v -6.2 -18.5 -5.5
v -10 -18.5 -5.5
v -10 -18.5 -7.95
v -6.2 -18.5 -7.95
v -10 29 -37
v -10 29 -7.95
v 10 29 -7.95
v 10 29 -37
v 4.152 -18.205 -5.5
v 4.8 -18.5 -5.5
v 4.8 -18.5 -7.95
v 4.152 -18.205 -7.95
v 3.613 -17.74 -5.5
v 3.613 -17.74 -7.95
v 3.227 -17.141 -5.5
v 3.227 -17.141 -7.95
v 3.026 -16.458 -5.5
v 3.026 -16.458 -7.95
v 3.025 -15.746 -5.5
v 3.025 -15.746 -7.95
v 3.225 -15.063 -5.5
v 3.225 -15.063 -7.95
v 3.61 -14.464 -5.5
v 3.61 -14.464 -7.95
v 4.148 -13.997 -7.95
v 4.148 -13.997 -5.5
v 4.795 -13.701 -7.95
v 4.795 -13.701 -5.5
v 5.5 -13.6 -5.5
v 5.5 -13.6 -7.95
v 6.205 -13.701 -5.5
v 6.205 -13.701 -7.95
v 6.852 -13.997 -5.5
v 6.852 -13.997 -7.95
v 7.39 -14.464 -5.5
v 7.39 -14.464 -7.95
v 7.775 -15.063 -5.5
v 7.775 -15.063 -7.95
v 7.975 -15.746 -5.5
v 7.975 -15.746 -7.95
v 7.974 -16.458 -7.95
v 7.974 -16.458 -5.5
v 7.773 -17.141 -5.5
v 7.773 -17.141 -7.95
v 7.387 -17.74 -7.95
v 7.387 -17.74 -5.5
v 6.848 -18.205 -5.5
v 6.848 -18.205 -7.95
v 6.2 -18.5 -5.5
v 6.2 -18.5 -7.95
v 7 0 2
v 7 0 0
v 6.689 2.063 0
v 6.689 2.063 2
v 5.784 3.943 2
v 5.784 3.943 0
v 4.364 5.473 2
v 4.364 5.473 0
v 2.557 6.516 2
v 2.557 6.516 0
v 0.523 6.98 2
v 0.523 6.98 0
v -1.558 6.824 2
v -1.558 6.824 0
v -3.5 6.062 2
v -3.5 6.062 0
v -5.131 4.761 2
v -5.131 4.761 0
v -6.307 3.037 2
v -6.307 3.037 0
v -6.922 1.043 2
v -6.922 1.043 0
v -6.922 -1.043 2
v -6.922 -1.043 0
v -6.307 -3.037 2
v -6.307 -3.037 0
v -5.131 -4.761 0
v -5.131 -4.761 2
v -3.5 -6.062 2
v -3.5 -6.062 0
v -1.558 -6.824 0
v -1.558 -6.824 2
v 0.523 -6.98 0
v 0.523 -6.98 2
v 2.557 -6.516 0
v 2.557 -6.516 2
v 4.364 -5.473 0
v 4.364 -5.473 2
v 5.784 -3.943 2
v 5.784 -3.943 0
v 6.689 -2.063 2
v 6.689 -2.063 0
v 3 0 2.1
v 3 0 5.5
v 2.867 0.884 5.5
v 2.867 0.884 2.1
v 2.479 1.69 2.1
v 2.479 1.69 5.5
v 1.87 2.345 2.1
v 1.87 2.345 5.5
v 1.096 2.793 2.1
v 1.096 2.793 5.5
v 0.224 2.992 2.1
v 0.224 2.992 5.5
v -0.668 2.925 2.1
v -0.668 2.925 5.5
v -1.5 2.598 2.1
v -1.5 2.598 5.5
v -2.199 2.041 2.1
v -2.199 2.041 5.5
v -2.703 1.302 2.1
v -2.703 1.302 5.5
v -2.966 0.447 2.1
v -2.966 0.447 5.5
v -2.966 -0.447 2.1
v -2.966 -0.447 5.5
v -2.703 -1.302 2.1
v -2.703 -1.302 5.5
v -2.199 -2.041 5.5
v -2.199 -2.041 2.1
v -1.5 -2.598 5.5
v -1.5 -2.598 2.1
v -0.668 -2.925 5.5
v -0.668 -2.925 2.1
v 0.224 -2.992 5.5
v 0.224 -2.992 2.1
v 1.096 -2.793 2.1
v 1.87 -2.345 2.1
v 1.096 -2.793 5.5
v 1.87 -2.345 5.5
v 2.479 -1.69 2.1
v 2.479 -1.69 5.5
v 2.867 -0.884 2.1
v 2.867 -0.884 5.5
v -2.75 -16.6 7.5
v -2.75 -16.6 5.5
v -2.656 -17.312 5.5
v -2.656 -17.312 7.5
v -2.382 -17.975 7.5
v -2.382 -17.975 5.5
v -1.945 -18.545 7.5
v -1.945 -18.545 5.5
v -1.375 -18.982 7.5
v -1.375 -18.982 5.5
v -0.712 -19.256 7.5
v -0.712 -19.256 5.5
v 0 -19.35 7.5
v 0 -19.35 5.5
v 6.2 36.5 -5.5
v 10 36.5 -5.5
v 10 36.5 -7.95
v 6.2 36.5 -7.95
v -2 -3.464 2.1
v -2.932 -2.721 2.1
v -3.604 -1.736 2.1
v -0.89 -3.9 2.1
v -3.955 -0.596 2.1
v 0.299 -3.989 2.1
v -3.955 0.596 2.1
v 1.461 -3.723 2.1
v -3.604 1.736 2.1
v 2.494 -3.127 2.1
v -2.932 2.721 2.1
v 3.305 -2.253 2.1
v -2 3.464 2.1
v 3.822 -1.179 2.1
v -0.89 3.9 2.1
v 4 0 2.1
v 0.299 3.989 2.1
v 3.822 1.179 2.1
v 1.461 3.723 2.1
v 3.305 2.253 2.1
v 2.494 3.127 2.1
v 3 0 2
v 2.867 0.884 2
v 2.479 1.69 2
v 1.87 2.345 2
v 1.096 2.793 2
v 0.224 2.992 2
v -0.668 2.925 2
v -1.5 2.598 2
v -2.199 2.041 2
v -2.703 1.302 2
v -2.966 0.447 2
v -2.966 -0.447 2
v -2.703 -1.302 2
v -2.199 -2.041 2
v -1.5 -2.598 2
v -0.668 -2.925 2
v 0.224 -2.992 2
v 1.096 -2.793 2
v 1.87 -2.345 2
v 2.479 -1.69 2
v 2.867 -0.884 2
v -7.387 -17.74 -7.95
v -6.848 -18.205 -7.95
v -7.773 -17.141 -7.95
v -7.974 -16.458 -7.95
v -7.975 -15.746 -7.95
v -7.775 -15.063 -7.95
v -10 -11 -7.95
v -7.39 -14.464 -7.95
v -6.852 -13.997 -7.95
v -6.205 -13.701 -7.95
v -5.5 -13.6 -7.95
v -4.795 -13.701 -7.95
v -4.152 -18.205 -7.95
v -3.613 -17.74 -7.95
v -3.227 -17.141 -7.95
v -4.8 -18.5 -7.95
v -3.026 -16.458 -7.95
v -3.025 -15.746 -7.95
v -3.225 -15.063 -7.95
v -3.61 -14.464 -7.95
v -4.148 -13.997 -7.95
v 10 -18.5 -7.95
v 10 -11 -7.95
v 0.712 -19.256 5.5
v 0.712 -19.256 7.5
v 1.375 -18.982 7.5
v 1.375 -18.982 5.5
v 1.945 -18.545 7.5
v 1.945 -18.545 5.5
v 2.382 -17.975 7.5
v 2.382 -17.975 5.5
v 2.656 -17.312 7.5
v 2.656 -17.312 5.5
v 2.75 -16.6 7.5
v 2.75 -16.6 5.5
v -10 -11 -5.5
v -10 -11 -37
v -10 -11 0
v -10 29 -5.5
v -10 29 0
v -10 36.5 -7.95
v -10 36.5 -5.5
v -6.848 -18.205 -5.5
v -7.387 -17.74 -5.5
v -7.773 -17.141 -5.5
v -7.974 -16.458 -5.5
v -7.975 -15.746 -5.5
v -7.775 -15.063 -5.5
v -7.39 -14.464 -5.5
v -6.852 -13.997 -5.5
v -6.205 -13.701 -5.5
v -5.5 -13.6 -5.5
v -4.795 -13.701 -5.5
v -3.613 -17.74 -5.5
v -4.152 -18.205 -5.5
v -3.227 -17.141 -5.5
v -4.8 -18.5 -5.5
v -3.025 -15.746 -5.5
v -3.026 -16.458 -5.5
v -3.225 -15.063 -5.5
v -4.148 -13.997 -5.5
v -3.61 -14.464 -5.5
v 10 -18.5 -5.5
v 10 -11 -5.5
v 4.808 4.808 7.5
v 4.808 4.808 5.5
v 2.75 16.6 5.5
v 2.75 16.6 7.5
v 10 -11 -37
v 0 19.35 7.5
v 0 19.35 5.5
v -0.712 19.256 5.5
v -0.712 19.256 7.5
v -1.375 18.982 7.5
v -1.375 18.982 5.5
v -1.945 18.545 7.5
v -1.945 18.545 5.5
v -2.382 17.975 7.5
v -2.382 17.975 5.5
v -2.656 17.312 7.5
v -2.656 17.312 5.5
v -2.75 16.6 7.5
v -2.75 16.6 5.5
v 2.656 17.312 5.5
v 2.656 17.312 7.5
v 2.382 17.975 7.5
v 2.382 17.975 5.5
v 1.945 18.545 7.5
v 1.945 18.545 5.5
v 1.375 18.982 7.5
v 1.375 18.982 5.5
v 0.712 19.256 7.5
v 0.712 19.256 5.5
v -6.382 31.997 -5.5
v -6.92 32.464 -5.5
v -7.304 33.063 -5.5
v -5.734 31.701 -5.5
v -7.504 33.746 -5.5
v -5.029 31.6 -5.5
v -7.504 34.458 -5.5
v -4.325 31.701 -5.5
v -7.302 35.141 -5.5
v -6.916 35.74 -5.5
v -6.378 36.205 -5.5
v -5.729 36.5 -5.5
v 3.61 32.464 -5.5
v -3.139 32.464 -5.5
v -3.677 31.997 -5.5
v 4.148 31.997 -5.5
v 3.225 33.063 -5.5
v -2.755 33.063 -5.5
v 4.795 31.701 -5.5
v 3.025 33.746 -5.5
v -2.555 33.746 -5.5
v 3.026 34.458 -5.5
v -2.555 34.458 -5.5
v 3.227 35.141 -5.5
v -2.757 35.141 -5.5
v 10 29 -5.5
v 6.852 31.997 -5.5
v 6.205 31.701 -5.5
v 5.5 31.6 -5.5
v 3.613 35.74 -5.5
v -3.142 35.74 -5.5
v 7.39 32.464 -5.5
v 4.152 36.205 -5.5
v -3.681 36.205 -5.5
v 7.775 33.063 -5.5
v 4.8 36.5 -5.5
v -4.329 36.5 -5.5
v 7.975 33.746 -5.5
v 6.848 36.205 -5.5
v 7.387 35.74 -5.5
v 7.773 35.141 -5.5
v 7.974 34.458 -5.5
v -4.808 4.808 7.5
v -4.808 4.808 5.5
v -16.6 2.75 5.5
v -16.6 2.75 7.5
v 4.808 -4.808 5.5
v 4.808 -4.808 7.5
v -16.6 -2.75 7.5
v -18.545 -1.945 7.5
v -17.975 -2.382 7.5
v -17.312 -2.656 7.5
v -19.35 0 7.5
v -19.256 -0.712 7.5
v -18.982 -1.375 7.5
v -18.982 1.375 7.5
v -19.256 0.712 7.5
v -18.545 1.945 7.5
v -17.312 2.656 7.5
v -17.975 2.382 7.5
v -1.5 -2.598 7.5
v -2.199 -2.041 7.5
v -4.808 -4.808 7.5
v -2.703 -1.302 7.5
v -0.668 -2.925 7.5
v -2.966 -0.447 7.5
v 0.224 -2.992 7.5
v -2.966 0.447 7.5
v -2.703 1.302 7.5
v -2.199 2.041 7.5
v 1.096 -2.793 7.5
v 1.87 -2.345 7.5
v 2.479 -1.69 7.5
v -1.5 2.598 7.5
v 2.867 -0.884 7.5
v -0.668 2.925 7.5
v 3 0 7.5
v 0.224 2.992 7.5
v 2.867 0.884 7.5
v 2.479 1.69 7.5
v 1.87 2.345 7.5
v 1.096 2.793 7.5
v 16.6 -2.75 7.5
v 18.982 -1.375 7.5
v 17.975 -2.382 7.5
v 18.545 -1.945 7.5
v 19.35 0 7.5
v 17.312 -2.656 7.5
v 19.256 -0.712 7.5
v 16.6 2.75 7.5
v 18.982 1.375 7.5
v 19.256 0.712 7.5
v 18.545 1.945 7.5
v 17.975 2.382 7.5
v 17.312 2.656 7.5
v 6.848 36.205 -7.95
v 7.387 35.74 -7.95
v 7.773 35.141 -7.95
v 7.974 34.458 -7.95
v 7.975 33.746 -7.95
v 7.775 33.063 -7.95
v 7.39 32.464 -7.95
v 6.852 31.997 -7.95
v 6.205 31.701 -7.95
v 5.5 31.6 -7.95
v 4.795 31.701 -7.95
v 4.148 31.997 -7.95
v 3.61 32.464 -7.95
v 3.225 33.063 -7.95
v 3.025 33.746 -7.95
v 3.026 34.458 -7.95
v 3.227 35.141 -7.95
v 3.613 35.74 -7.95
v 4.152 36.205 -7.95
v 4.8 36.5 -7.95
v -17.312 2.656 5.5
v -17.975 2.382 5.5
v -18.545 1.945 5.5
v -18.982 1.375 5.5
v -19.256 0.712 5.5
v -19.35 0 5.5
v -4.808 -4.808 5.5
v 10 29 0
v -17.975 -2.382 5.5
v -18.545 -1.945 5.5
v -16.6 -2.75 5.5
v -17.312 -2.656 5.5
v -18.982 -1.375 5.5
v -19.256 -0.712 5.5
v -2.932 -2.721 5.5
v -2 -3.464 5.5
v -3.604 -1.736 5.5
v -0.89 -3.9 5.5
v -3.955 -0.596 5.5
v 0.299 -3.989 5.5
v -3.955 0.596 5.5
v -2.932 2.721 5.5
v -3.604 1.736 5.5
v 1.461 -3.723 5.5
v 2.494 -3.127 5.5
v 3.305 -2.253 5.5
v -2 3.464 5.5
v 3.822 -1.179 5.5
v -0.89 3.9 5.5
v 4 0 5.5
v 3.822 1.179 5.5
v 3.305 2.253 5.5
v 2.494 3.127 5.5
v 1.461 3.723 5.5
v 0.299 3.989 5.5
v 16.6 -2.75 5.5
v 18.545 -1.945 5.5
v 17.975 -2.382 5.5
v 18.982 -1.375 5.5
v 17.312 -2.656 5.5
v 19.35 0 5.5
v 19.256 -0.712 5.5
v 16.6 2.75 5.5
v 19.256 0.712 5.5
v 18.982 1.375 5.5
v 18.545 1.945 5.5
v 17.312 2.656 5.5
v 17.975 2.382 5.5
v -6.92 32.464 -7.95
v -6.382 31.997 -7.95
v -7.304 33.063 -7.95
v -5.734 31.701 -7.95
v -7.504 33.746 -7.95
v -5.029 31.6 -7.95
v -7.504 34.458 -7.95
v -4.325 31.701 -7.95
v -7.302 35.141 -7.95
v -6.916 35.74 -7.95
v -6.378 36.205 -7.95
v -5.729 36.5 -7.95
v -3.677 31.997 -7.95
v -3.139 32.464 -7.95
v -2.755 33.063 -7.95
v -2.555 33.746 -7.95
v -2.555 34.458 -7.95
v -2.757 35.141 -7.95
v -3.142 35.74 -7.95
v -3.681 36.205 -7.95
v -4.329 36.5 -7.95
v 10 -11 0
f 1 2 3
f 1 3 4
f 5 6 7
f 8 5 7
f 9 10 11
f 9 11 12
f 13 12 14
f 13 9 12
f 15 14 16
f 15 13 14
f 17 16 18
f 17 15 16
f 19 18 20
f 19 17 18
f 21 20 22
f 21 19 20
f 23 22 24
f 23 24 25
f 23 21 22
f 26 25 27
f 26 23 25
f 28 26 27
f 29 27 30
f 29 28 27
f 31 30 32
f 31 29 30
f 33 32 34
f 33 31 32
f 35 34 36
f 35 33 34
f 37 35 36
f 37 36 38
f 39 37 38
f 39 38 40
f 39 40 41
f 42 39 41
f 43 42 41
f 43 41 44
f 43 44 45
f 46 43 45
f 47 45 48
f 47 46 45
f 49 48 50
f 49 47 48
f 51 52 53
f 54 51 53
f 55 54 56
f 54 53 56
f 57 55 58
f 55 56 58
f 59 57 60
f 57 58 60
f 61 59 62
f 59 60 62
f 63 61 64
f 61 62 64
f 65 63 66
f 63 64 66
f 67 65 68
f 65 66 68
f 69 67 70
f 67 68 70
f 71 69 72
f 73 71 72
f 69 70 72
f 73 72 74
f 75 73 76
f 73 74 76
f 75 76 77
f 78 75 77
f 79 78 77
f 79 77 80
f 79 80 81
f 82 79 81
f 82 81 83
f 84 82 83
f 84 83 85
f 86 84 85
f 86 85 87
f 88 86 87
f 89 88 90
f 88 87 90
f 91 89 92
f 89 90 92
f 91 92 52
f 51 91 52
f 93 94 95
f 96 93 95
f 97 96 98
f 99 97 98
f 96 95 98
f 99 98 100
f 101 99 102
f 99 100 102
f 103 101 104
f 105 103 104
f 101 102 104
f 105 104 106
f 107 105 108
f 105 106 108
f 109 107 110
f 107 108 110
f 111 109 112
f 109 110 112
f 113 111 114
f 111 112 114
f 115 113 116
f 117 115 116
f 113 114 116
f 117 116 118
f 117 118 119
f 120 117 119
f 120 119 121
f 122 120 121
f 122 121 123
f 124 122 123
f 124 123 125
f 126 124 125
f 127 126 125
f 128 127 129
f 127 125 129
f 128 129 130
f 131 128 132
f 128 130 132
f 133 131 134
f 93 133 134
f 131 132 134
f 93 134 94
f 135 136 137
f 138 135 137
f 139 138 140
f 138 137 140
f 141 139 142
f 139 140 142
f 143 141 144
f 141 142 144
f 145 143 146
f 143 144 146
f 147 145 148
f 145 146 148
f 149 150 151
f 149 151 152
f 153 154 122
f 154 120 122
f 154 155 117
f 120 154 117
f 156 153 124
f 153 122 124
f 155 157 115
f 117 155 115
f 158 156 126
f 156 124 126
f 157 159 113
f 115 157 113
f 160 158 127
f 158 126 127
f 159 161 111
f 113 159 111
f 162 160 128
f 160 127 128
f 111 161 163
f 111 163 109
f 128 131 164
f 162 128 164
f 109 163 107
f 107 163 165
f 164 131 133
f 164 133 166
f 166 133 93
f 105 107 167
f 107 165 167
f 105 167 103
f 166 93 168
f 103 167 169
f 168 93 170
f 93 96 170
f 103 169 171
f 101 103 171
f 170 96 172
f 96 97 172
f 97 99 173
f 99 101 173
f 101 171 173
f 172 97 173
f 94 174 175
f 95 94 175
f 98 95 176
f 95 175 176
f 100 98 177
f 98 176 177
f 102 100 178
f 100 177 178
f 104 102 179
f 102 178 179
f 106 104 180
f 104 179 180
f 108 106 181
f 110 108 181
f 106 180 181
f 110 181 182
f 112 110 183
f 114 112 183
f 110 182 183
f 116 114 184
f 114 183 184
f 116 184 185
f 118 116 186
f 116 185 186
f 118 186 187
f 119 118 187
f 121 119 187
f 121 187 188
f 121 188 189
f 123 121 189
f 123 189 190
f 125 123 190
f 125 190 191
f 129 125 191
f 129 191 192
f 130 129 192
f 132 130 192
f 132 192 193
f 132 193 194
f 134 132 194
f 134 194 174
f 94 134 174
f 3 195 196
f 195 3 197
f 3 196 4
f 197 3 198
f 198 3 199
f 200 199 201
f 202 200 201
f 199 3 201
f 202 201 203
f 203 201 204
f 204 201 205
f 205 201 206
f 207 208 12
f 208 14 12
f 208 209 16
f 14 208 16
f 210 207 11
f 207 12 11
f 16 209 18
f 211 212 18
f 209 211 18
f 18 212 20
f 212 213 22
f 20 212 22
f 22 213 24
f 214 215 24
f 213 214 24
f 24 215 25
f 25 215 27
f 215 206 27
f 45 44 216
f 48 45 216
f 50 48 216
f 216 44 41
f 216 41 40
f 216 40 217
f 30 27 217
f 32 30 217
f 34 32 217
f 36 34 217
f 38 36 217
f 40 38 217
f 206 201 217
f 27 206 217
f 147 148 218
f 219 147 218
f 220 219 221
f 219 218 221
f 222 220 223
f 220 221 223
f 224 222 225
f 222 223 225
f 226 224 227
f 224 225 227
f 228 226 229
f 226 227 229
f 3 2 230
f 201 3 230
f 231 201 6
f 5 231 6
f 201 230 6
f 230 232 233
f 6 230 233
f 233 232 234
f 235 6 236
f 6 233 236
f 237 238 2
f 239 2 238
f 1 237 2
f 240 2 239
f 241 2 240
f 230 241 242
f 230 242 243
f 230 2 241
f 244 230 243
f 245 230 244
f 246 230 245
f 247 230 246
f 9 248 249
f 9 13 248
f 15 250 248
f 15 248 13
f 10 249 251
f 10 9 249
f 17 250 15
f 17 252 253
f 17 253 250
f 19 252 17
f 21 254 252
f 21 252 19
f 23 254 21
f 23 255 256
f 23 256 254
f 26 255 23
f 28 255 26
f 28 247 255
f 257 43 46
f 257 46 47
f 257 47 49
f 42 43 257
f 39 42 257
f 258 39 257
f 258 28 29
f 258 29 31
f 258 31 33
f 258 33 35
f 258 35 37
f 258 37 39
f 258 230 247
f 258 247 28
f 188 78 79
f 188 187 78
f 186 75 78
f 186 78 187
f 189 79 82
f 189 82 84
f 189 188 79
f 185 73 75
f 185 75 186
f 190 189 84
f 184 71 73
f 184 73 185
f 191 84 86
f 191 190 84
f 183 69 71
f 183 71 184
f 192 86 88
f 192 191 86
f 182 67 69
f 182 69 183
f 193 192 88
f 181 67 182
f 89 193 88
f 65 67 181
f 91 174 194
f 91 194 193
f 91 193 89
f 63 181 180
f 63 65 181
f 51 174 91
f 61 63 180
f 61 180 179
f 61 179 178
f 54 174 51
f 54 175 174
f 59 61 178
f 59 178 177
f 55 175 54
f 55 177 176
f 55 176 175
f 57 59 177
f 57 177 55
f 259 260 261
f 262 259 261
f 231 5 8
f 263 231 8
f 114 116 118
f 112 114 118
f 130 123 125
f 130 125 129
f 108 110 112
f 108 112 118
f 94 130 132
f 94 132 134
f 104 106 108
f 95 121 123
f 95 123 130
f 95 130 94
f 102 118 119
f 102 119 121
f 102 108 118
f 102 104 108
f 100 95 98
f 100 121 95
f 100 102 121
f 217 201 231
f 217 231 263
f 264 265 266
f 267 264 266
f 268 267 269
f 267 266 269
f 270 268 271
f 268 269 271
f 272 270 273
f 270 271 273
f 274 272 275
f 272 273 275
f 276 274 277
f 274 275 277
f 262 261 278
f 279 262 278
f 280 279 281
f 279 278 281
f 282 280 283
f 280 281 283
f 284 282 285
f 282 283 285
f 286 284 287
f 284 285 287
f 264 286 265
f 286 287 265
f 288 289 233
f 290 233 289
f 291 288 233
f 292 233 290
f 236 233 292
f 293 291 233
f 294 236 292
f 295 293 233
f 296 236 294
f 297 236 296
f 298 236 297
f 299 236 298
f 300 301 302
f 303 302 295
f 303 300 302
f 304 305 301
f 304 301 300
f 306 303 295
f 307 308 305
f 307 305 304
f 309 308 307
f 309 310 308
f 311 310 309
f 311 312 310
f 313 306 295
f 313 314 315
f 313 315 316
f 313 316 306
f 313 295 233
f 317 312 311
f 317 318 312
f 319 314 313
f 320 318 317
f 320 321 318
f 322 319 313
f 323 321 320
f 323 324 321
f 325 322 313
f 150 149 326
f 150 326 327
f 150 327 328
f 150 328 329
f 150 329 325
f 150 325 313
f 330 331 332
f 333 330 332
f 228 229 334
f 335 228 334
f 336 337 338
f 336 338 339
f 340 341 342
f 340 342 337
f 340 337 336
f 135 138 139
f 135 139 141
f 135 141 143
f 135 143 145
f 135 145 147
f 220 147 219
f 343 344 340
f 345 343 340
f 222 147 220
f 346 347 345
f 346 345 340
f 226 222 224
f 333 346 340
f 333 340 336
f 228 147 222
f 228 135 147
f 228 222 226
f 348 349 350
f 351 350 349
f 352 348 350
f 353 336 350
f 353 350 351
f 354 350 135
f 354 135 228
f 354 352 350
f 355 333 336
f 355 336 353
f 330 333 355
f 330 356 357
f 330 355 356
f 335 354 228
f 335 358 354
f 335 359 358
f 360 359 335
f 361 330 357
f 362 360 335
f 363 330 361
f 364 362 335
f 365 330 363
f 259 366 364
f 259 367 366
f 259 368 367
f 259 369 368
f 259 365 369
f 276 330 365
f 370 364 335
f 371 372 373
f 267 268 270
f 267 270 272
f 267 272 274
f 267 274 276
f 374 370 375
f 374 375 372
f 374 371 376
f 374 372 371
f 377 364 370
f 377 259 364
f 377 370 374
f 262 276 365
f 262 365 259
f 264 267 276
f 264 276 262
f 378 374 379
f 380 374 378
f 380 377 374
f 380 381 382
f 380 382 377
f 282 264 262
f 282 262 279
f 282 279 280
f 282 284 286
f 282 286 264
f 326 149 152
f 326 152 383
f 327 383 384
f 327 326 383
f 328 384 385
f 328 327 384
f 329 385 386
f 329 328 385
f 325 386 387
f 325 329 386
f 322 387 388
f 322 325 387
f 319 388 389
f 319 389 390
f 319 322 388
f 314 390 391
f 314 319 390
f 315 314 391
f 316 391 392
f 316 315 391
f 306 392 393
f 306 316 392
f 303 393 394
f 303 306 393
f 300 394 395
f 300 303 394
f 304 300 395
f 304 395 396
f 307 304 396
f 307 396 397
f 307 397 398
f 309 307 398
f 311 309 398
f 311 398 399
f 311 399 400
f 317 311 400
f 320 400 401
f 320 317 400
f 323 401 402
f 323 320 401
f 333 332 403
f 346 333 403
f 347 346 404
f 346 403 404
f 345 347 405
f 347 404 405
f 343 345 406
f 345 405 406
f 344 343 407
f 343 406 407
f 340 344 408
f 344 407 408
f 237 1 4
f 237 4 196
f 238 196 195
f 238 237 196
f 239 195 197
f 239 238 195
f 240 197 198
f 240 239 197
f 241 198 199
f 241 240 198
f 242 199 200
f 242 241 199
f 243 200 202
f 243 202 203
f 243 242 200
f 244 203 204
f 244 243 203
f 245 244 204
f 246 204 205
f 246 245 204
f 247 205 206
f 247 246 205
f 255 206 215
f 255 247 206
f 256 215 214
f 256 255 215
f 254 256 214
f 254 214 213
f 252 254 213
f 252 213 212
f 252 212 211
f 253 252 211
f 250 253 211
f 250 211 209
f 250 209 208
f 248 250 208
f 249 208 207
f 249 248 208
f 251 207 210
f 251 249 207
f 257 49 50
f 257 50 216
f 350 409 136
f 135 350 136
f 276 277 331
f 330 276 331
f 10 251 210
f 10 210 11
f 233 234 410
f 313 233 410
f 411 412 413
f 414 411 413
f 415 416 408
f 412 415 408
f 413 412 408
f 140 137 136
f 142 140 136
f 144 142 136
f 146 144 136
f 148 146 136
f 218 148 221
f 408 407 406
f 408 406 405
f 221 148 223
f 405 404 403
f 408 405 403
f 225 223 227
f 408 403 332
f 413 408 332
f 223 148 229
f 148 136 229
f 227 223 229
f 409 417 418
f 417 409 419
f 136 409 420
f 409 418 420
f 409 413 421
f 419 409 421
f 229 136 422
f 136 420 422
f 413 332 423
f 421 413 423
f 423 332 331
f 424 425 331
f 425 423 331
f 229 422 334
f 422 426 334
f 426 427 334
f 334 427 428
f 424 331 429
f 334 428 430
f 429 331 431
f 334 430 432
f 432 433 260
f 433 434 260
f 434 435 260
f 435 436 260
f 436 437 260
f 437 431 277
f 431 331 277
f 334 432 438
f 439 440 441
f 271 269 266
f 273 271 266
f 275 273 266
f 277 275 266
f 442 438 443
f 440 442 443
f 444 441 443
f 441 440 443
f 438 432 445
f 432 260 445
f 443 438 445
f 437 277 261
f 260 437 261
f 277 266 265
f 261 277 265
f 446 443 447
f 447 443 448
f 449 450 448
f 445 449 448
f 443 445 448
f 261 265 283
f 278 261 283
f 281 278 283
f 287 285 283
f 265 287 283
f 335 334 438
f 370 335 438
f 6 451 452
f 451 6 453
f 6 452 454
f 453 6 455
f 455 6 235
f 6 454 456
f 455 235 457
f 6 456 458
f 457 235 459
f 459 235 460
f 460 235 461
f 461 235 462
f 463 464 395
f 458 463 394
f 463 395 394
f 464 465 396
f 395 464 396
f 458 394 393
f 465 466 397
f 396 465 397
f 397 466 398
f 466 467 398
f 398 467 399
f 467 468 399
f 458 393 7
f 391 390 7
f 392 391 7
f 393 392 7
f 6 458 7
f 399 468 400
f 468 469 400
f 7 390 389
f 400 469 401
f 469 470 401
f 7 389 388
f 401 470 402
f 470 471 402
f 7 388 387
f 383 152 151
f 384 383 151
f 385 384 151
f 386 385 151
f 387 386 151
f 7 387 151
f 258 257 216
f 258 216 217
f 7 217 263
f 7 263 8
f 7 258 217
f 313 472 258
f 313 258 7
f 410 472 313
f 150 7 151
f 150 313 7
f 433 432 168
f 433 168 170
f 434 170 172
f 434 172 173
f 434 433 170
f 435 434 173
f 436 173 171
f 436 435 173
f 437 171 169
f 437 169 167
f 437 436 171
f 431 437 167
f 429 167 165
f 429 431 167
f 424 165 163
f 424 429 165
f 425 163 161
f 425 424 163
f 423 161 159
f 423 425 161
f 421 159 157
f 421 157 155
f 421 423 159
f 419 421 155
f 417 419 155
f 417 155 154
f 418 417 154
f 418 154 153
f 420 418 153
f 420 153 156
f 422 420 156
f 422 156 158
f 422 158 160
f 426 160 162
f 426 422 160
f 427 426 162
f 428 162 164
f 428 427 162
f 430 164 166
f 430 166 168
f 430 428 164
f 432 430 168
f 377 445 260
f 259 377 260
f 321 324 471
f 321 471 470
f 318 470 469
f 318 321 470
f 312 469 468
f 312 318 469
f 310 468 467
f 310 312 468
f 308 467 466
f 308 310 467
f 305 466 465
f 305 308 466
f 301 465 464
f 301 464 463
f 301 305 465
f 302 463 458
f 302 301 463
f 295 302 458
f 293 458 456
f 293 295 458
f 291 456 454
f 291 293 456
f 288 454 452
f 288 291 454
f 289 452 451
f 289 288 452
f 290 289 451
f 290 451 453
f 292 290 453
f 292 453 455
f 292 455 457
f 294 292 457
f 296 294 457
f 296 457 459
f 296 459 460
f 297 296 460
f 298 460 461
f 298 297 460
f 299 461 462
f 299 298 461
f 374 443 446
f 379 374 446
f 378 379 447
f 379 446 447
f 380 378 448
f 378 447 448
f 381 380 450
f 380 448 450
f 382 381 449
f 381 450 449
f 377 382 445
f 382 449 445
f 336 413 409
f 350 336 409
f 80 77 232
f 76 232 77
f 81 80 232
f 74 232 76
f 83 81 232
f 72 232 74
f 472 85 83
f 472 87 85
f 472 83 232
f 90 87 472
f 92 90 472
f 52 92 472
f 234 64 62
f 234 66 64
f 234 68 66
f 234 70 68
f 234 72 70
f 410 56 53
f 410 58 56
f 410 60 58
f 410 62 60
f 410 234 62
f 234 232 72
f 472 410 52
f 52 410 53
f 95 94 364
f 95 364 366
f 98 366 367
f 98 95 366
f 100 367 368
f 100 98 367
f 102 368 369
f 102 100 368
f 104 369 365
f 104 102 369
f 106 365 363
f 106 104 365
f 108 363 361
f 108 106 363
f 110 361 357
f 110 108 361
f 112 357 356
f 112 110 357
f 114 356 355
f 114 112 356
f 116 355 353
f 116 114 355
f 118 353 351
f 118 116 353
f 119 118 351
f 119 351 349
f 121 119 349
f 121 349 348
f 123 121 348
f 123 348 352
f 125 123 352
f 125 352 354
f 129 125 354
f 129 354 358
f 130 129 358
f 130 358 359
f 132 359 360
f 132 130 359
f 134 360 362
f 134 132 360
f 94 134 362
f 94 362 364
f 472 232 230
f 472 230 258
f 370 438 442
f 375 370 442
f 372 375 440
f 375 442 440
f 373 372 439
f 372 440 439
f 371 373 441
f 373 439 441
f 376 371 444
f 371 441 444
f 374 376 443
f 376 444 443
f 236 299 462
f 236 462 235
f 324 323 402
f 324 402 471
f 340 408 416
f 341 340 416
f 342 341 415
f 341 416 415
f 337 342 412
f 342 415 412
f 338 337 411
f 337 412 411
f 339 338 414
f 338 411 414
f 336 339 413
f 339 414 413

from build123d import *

# Parameters (mm, degrees)
F0_R     = 7
F0_R_2   = 3
F1_DEPTH = 2
F2_DEPTH = 5.5
F0_W     = 20
F0_H     = 40
F3_DEPTH = 37
F4_START = -5.5
F4_DEPTH = 2.45
F5_R     = 4
F5_R_2   = 3
F6_DEPTH = 2
F7_DEPTH = 3.4


with BuildPart() as f1:
    # F0 (on Top) → F1 (new body)
    with BuildSketch(Plane.XY):
        Circle(F0_R)
        Circle(F0_R_2, mode=Mode.SUBTRACT)
        Circle(F0_R_2)
    extrude(amount=F1_DEPTH)

    # F0 (on Top) → F2 (join)
    with BuildSketch(Plane.XY):
        Circle(F0_R_2)
    extrude(amount=F2_DEPTH)

    # F0 (on Top) → F3 (join)
    with BuildSketch(Plane.XY):
        with Locations((0, 9)):
            Rectangle(F0_W, F0_H)
        Circle(F0_R, mode=Mode.SUBTRACT)
        Circle(F0_R)
        Circle(F0_R_2, mode=Mode.SUBTRACT)
        Circle(F0_R_2)
    extrude(amount=-F3_DEPTH)

    # F0 (on Top) → F4 (join)
    with BuildSketch(Plane.XY.offset(F4_START)):
        with BuildLine():
            Line((-10, 29), (10, 29))
            Line((10, 29), (10, 36.5))
            Line((10, 36.5), (6.2, 36.5))
            ThreePointArc((6.2, 36.5), (7.5, 35.6), (8, 34.1))
            ThreePointArc((8, 34.1), (4, 32.1), (4.8, 36.5))
            Line((4.8, 36.5), (-4.3294117647, 36.5))
            ThreePointArc((-4.3294117647, 36.5), (-3.0294117647, 35.6), (-2.5294117647, 34.1))
            ThreePointArc((-2.5294117647, 34.1), (-6.5294117647, 32.1), (-5.7294117647, 36.5))
            Line((-5.7294117647, 36.5), (-10, 36.5))
            Line((-10, 36.5), (-10, 29))
        make_face()
        with BuildLine():
            Line((6.2, -18.5), (10, -18.5))
            Line((10, -18.5), (10, -11))
            Line((10, -11), (-10, -11))
            Line((-10, -11), (-10, -18.5))
            Line((-10, -18.5), (-6.2, -18.5))
            ThreePointArc((-6.2, -18.5), (-7, -14.1), (-3, -16.1))
            ThreePointArc((-3, -16.1), (-3.5, -17.6), (-4.8, -18.5))
            Line((-4.8, -18.5), (4.8, -18.5))
            ThreePointArc((4.8, -18.5), (4, -14.1), (8, -16.1))
            ThreePointArc((8, -16.1), (7.5, -17.6), (6.2, -18.5))
        make_face()
    extrude(amount=-F4_DEPTH)


with BuildPart() as f6:
    # F5 (on face) → F6 (new body)
    with BuildSketch(Plane.XY.offset(5.5)):
        with BuildLine():
            ThreePointArc((-16.6, 2.75), (-18.5445436483, 1.9445436483), (-19.35, 0))
            ThreePointArc((-19.35, 0), (-18.5445436483, -1.9445436483), (-16.6, -2.75))
            Line((-16.6, -2.75), (-4.8083261121, -4.8083261121))
            Line((-4.8083261121, -4.8083261121), (-2.75, -16.6))
            ThreePointArc((-2.75, -16.6), (-1.9445436483, -18.5445436483), (0, -19.35))
            ThreePointArc((0, -19.35), (1.9445436483, -18.5445436483), (2.75, -16.6))
            Line((2.75, -16.6), (4.8083261121, -4.8083261121))
            Line((4.8083261121, -4.8083261121), (16.6, -2.75))
            ThreePointArc((16.6, -2.75), (18.5445436483, -1.9445436483), (19.35, 0))
            ThreePointArc((19.35, 0), (18.5445436483, 1.9445436483), (16.6, 2.75))
            Line((16.6, 2.75), (4.8083261121, 4.8083261121))
            Line((4.8083261121, 4.8083261121), (2.75, 16.6))
            ThreePointArc((2.75, 16.6), (1.9445436483, 18.5445436483), (0, 19.35))
            ThreePointArc((0, 19.35), (-1.9445436483, 18.5445436483), (-2.75, 16.6))
            Line((-2.75, 16.6), (-4.8083261121, 4.8083261121))
            Line((-4.8083261121, 4.8083261121), (-16.6, 2.75))
        make_face()
        Circle(F5_R, mode=Mode.SUBTRACT)
        Circle(F5_R)
        Circle(F5_R_2, mode=Mode.SUBTRACT)
    extrude(amount=F6_DEPTH)

    # F5 (on face) → F7 (join)
    with BuildSketch(Plane.XY.offset(5.5)):
        Circle(F5_R)
        Circle(F5_R_2, mode=Mode.SUBTRACT)
    extrude(amount=-F7_DEPTH)


solid = Compound([f1.part, f6.part])
